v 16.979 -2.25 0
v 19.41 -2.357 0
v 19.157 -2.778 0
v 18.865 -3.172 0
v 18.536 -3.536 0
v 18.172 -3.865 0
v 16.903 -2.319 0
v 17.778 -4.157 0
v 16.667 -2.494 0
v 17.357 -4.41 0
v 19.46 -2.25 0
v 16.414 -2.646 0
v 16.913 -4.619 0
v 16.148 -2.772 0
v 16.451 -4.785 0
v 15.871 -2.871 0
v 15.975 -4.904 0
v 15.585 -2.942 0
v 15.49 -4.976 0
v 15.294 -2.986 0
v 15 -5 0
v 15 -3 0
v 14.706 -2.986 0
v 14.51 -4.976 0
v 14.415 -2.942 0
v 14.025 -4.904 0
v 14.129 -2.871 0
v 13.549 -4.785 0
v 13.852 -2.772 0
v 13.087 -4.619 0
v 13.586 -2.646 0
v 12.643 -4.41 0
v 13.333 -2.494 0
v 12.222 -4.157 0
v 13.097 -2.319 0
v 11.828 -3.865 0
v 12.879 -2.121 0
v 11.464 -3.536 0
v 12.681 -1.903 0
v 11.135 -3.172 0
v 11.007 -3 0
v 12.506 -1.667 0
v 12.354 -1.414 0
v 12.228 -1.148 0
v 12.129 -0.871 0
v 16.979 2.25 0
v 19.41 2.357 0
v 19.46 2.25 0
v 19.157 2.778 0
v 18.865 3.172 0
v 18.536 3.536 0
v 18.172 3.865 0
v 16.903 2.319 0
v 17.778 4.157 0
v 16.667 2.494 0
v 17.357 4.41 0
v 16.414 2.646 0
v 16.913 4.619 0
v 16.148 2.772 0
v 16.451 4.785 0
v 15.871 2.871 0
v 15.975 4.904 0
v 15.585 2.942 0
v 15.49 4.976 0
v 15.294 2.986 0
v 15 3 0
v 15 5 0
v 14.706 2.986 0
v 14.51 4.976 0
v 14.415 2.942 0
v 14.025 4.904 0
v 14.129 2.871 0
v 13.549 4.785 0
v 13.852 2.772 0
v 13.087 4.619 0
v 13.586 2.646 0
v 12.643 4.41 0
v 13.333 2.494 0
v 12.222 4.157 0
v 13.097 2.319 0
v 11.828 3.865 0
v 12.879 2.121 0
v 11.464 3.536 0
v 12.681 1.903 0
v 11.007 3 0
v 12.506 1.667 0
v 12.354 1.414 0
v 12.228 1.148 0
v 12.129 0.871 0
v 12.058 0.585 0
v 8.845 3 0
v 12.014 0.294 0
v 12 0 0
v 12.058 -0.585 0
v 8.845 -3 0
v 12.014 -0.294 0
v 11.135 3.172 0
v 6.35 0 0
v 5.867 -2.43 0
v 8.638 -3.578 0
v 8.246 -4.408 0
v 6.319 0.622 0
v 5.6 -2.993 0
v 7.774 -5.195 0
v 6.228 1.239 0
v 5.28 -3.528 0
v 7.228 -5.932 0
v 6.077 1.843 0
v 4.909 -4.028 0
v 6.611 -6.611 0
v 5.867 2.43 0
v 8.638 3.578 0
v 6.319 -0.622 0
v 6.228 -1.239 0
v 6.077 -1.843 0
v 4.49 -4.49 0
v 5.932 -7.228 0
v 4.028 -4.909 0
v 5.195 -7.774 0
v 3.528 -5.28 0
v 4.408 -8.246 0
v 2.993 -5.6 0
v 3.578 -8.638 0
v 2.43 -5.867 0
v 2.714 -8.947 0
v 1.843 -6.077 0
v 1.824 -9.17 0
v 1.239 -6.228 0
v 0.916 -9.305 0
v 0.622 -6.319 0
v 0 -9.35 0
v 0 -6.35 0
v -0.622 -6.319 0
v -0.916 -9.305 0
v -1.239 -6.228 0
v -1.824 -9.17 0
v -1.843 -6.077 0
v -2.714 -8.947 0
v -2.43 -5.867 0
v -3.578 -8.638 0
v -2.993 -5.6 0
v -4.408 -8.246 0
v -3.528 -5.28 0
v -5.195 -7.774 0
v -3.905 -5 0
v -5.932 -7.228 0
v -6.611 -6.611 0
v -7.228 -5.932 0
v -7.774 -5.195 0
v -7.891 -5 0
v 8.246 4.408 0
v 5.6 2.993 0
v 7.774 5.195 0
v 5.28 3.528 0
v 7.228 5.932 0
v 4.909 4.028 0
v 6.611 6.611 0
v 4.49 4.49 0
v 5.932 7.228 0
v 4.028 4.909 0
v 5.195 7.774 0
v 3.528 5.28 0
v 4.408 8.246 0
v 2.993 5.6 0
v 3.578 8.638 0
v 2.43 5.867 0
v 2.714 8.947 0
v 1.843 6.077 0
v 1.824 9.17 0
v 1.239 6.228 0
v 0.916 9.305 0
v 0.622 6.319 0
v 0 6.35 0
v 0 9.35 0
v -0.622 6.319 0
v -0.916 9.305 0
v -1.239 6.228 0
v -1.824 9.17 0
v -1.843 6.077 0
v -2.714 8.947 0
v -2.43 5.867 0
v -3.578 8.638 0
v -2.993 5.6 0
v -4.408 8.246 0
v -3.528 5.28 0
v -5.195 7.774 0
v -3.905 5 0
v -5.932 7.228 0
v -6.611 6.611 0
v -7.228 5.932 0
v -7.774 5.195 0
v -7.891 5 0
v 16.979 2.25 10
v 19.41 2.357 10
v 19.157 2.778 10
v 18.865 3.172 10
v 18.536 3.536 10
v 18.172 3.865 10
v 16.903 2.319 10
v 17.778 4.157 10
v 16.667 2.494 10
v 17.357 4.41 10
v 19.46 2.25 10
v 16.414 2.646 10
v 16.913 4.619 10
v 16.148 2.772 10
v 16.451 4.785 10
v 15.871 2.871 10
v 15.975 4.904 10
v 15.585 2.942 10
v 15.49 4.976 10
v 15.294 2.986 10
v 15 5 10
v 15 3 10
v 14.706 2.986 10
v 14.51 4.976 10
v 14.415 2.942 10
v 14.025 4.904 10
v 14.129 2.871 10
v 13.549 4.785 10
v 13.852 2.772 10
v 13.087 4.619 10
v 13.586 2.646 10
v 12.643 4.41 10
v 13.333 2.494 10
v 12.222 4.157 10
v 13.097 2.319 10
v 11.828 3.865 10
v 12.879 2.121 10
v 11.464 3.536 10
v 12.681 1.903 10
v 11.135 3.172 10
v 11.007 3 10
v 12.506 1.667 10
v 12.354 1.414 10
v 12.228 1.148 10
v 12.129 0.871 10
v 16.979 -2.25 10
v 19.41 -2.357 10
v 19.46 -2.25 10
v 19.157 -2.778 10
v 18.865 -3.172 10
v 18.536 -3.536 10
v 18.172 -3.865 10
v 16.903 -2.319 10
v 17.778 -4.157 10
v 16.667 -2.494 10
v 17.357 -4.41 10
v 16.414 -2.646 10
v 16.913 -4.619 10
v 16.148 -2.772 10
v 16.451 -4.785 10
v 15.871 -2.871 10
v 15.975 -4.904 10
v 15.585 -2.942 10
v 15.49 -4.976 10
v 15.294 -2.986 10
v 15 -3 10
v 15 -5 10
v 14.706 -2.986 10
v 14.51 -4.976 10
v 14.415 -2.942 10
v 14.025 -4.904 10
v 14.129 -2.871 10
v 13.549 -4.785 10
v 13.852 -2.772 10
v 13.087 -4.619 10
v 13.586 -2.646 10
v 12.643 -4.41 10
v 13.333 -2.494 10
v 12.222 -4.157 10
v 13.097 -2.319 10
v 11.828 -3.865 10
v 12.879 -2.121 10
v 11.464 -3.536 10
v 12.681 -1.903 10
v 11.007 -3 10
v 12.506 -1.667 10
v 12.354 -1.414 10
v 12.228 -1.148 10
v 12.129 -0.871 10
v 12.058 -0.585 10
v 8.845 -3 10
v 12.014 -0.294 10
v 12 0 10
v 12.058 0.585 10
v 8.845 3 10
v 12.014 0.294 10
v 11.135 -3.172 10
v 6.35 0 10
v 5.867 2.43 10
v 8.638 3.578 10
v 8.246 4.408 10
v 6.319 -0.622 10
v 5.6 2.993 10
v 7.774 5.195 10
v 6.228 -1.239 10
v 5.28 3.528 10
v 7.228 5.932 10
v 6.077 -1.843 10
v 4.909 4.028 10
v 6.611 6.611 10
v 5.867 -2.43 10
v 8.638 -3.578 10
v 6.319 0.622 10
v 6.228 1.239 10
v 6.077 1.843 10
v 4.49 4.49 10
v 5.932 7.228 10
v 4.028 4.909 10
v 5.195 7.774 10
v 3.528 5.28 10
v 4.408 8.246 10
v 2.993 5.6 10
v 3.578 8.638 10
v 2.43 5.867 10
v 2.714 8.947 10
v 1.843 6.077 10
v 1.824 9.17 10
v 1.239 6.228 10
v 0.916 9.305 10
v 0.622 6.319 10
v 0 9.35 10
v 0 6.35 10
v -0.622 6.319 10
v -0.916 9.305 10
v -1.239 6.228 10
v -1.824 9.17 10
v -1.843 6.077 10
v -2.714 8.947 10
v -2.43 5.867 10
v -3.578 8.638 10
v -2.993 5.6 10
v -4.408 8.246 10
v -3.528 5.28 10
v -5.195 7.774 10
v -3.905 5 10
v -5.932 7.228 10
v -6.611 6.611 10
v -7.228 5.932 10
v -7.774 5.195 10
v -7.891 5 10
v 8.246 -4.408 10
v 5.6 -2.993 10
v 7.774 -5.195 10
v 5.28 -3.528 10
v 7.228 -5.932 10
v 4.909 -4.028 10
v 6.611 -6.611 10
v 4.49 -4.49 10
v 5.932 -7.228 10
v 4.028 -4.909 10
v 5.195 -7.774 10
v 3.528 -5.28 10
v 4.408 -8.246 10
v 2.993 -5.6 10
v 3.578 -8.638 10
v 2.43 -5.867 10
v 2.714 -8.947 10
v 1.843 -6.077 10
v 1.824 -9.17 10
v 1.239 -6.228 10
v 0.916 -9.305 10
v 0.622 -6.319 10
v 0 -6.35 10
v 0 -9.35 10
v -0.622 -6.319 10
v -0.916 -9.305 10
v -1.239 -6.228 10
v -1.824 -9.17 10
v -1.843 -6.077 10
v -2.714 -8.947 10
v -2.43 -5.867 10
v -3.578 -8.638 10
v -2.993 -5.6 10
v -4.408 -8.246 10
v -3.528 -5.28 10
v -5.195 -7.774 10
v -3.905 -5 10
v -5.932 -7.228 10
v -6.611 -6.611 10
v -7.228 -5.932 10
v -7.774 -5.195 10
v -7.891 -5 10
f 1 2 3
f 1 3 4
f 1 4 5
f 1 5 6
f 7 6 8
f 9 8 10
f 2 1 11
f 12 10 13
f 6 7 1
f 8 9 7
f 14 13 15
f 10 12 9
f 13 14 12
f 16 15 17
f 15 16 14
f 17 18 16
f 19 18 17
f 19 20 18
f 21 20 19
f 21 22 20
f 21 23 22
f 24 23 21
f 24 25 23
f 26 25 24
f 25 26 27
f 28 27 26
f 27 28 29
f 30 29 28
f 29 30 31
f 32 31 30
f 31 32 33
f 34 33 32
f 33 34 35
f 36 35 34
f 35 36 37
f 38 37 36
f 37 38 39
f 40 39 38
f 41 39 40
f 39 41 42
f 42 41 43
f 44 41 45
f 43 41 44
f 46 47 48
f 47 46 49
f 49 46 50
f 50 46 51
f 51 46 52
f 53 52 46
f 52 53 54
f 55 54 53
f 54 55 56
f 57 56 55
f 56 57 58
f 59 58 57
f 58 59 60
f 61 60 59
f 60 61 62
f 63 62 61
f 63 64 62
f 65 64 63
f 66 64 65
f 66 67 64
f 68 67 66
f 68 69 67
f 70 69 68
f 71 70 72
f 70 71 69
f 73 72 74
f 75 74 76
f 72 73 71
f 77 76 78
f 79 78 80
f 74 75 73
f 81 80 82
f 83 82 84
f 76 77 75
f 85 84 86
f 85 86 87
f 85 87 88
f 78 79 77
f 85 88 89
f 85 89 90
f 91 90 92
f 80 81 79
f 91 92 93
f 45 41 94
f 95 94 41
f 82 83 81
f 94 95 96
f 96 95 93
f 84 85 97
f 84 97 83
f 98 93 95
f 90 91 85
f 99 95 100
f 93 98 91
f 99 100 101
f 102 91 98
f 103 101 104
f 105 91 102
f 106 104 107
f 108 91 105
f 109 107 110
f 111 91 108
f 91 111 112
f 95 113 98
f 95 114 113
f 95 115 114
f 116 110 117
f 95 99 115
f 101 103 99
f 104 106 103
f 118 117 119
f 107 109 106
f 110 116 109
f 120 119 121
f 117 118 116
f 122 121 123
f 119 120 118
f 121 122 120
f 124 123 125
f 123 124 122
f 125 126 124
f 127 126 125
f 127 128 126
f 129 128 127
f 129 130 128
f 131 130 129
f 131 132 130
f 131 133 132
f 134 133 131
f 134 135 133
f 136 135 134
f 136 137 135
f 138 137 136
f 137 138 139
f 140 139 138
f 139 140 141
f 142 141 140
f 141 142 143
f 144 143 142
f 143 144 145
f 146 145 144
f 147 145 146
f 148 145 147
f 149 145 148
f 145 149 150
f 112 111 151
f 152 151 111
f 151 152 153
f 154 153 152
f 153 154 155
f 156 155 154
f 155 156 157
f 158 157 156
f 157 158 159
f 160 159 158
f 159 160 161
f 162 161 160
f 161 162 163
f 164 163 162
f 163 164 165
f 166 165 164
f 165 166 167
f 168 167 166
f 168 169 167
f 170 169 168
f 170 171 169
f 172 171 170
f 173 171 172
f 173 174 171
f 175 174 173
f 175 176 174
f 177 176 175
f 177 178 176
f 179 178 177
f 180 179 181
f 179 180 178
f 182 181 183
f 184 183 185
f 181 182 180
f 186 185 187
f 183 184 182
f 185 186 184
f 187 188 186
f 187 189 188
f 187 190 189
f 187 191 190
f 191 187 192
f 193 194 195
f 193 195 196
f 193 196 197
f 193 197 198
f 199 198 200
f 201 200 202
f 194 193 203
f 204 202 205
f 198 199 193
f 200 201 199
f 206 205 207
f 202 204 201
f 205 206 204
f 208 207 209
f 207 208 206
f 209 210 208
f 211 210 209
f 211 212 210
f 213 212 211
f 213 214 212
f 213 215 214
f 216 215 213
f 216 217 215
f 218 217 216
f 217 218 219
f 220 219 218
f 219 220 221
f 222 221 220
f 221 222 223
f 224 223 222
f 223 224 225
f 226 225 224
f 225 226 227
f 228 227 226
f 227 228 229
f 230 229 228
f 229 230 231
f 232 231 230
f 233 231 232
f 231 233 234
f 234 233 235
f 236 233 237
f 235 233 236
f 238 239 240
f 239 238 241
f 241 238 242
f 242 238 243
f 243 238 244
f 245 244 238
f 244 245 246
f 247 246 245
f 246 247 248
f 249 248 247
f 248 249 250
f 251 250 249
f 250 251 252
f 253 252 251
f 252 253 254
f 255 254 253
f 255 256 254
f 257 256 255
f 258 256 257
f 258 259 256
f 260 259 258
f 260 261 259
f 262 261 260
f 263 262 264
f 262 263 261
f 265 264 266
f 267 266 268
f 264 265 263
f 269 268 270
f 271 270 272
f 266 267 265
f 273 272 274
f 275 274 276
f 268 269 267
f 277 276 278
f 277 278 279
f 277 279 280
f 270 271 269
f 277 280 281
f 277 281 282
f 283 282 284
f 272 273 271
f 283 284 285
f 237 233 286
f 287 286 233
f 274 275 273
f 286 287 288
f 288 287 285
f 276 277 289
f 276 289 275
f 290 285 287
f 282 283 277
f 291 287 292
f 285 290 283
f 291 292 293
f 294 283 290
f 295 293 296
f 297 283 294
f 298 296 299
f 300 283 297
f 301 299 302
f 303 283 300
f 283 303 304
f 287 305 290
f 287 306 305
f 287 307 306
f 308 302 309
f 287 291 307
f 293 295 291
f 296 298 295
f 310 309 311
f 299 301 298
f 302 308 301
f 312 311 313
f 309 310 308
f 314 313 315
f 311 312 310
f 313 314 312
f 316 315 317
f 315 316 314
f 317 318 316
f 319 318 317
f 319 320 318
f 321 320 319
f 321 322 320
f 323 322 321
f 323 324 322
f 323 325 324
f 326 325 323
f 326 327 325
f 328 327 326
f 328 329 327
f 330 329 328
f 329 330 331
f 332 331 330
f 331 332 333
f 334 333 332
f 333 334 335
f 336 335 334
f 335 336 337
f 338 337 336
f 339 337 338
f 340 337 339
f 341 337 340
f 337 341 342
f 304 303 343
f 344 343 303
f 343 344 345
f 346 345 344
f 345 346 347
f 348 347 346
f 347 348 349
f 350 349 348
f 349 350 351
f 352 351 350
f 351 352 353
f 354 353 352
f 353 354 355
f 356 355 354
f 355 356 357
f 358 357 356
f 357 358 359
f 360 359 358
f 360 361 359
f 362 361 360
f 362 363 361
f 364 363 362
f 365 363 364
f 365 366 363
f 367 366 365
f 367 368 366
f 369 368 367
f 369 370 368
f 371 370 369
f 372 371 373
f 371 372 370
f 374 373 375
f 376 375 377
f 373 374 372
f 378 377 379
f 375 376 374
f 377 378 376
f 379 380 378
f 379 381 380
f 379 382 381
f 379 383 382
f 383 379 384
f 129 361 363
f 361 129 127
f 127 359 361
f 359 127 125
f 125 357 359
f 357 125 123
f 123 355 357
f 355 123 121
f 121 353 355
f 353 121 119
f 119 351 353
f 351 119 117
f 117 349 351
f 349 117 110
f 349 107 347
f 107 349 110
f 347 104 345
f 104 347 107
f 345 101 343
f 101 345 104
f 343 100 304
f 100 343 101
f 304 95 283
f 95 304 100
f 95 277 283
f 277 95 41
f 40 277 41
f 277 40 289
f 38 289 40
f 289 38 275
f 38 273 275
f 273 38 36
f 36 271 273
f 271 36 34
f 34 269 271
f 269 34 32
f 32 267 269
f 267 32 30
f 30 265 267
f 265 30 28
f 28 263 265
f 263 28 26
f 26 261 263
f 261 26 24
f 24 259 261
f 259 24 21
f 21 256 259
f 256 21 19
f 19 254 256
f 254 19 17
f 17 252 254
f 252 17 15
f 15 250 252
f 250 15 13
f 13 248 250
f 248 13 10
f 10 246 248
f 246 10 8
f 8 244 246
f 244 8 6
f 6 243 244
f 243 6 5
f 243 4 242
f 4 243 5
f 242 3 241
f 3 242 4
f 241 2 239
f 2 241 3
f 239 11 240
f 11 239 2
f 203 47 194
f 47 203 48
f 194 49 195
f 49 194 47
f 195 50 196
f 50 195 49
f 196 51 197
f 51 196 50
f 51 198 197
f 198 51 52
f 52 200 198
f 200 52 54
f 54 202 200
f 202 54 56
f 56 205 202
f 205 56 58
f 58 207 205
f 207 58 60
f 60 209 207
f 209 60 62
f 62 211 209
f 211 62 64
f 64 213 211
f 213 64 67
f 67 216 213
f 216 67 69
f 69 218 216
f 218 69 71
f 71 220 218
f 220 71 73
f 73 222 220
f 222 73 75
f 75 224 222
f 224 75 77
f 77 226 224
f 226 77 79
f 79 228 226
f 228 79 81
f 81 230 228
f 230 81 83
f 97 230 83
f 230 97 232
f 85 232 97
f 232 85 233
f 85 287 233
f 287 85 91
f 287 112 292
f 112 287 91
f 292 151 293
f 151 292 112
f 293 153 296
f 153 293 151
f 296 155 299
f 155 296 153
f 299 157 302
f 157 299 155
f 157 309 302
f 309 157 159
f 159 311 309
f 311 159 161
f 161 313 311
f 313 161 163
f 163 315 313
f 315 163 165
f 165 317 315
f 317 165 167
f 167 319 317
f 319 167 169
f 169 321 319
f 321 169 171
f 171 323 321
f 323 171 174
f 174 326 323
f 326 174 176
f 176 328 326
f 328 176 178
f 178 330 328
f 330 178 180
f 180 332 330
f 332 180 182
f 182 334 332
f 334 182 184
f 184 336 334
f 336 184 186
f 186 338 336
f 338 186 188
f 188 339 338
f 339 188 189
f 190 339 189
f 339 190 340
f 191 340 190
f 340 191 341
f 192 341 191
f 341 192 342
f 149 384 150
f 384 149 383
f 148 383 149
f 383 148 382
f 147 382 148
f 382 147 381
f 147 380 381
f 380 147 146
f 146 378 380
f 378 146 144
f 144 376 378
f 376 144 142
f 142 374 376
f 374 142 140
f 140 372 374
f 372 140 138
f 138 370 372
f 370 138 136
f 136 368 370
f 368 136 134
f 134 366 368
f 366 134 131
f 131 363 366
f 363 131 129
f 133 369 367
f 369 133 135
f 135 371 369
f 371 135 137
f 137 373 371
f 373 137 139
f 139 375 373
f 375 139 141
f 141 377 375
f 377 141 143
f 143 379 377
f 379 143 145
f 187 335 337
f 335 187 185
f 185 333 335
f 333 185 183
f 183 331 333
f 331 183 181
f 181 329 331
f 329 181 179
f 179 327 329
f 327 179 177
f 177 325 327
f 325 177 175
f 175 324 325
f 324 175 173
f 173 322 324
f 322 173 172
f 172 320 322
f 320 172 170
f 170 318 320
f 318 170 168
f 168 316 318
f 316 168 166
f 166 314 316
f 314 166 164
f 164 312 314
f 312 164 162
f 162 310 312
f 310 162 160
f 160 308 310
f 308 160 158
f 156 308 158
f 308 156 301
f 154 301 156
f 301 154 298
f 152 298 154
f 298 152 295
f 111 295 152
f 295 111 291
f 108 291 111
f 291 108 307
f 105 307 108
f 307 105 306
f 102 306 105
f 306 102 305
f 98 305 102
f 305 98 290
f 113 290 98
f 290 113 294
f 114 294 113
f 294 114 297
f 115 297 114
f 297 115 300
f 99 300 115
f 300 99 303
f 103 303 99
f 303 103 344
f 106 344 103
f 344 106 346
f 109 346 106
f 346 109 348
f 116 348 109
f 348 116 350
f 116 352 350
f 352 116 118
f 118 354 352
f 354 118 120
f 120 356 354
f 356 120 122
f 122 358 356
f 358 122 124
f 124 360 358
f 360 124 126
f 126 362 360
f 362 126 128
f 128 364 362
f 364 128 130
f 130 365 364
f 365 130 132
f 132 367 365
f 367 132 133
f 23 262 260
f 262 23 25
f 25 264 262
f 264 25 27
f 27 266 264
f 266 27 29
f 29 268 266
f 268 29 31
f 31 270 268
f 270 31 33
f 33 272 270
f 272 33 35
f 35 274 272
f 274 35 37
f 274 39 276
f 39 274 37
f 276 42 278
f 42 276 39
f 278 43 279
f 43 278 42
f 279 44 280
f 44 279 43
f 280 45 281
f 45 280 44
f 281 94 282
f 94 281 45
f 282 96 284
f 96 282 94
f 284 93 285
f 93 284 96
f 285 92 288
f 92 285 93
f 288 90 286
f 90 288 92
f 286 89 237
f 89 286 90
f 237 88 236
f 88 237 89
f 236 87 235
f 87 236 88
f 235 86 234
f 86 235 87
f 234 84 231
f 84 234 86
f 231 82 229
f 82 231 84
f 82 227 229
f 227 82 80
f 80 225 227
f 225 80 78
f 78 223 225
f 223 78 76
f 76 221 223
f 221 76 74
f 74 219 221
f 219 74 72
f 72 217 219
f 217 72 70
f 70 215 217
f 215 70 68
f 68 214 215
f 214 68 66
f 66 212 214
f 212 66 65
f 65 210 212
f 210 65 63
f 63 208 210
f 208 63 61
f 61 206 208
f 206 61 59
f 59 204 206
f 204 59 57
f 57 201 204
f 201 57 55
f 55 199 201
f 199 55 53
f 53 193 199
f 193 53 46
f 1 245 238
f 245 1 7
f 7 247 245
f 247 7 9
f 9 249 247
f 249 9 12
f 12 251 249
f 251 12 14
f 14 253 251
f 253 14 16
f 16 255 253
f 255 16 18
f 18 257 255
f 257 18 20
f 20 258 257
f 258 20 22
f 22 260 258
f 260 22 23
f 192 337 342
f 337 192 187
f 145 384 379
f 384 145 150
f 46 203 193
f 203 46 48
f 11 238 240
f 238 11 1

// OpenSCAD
// Snap-on clip for 12.7mm rod and 6mm tubing
// Corrected: Subtraction is performed on the final union to ensure holes are actually cut.

// --- Dimensions ---
rod_id      = 12.7;    // Inner diameter of the rod ring
rod_wall    = 3.0;     // Wall thickness of the rod ring
rod_od      = rod_id + 2 * rod_wall; // 18.7 mm

rod_gap_w   = 10.0;    // Width of the opening in the rod ring
rod_gap_h   = 10.0;    // Height of the opening in the rod ring

tube_id     = 6.0;     // Inner diameter of the tubing ring
tube_wall   = 2.0;     // Wall thickness of the tubing ring
tube_od     = tube_id + 2 * tube_wall; // 10.0 mm

tube_gap_w  = 4.5;     // Width of the opening in the tubing ring
tube_gap_h  = 4.5;     // Height of the tubing ring opening

bridge_w_y  = 6.0;     // Width of the bridge along the Y axis
bridge_x_min = 8.0;    // Start of the bridge on X axis
bridge_x_max = 12.0;   // End of the bridge on X axis

clip_height = 10.0;    // Extrusion height (Z)
tube_offset_x = 15.0;  // X-coordinate of the tubing ring center

$fn = 64;

// --- 2D Profiles (Solid only) ---

module rod_ring_solid() {
    difference() {
        circle(d = rod_od);
        circle(d = rod_id);
    }
}

module tube_ring_solid() {
    difference() {
        circle(d = tube_od);
        circle(d = tube_id);
    }
}

module bridge_solid() {
    translate([bridge_x_min, -bridge_w_y/2])
        square([bridge_x_max - bridge_x_min, bridge_w_y]);
}

// --- Final Assembly ---

// We build the solid body first, then subtract the gaps.
difference() {
    // The solid body
    linear_extrude(height = clip_height) {
        union() {
            rod_ring_solid();
            translate([tube_offset_x, 0]) tube_ring_solid();
            bridge_solid();
        }
    }

    // 1. Rod ring cutout: x < 0 and -5 < y < 5
    // We use a large rectangle to ensure it cuts through the edge.
    // The spec says "everything with x < 0 and -5 < y < 5 is removed".
    translate([-rod_od - 1, -5]) 
        linear_extrude(height = clip_height + 2) 
            square([rod_od, 10]);

    // 2. Tubing ring cutout: x > 15 and -2.25 < y < 2.25
    // The spec says "x > 15 and -2.25 < y < 2.25 is removed".
    translate([tube_offset_x, -2.25]) 
        linear_extrude(height = clip_height + 2) 
            square([tube_od, 4.5]);
}
